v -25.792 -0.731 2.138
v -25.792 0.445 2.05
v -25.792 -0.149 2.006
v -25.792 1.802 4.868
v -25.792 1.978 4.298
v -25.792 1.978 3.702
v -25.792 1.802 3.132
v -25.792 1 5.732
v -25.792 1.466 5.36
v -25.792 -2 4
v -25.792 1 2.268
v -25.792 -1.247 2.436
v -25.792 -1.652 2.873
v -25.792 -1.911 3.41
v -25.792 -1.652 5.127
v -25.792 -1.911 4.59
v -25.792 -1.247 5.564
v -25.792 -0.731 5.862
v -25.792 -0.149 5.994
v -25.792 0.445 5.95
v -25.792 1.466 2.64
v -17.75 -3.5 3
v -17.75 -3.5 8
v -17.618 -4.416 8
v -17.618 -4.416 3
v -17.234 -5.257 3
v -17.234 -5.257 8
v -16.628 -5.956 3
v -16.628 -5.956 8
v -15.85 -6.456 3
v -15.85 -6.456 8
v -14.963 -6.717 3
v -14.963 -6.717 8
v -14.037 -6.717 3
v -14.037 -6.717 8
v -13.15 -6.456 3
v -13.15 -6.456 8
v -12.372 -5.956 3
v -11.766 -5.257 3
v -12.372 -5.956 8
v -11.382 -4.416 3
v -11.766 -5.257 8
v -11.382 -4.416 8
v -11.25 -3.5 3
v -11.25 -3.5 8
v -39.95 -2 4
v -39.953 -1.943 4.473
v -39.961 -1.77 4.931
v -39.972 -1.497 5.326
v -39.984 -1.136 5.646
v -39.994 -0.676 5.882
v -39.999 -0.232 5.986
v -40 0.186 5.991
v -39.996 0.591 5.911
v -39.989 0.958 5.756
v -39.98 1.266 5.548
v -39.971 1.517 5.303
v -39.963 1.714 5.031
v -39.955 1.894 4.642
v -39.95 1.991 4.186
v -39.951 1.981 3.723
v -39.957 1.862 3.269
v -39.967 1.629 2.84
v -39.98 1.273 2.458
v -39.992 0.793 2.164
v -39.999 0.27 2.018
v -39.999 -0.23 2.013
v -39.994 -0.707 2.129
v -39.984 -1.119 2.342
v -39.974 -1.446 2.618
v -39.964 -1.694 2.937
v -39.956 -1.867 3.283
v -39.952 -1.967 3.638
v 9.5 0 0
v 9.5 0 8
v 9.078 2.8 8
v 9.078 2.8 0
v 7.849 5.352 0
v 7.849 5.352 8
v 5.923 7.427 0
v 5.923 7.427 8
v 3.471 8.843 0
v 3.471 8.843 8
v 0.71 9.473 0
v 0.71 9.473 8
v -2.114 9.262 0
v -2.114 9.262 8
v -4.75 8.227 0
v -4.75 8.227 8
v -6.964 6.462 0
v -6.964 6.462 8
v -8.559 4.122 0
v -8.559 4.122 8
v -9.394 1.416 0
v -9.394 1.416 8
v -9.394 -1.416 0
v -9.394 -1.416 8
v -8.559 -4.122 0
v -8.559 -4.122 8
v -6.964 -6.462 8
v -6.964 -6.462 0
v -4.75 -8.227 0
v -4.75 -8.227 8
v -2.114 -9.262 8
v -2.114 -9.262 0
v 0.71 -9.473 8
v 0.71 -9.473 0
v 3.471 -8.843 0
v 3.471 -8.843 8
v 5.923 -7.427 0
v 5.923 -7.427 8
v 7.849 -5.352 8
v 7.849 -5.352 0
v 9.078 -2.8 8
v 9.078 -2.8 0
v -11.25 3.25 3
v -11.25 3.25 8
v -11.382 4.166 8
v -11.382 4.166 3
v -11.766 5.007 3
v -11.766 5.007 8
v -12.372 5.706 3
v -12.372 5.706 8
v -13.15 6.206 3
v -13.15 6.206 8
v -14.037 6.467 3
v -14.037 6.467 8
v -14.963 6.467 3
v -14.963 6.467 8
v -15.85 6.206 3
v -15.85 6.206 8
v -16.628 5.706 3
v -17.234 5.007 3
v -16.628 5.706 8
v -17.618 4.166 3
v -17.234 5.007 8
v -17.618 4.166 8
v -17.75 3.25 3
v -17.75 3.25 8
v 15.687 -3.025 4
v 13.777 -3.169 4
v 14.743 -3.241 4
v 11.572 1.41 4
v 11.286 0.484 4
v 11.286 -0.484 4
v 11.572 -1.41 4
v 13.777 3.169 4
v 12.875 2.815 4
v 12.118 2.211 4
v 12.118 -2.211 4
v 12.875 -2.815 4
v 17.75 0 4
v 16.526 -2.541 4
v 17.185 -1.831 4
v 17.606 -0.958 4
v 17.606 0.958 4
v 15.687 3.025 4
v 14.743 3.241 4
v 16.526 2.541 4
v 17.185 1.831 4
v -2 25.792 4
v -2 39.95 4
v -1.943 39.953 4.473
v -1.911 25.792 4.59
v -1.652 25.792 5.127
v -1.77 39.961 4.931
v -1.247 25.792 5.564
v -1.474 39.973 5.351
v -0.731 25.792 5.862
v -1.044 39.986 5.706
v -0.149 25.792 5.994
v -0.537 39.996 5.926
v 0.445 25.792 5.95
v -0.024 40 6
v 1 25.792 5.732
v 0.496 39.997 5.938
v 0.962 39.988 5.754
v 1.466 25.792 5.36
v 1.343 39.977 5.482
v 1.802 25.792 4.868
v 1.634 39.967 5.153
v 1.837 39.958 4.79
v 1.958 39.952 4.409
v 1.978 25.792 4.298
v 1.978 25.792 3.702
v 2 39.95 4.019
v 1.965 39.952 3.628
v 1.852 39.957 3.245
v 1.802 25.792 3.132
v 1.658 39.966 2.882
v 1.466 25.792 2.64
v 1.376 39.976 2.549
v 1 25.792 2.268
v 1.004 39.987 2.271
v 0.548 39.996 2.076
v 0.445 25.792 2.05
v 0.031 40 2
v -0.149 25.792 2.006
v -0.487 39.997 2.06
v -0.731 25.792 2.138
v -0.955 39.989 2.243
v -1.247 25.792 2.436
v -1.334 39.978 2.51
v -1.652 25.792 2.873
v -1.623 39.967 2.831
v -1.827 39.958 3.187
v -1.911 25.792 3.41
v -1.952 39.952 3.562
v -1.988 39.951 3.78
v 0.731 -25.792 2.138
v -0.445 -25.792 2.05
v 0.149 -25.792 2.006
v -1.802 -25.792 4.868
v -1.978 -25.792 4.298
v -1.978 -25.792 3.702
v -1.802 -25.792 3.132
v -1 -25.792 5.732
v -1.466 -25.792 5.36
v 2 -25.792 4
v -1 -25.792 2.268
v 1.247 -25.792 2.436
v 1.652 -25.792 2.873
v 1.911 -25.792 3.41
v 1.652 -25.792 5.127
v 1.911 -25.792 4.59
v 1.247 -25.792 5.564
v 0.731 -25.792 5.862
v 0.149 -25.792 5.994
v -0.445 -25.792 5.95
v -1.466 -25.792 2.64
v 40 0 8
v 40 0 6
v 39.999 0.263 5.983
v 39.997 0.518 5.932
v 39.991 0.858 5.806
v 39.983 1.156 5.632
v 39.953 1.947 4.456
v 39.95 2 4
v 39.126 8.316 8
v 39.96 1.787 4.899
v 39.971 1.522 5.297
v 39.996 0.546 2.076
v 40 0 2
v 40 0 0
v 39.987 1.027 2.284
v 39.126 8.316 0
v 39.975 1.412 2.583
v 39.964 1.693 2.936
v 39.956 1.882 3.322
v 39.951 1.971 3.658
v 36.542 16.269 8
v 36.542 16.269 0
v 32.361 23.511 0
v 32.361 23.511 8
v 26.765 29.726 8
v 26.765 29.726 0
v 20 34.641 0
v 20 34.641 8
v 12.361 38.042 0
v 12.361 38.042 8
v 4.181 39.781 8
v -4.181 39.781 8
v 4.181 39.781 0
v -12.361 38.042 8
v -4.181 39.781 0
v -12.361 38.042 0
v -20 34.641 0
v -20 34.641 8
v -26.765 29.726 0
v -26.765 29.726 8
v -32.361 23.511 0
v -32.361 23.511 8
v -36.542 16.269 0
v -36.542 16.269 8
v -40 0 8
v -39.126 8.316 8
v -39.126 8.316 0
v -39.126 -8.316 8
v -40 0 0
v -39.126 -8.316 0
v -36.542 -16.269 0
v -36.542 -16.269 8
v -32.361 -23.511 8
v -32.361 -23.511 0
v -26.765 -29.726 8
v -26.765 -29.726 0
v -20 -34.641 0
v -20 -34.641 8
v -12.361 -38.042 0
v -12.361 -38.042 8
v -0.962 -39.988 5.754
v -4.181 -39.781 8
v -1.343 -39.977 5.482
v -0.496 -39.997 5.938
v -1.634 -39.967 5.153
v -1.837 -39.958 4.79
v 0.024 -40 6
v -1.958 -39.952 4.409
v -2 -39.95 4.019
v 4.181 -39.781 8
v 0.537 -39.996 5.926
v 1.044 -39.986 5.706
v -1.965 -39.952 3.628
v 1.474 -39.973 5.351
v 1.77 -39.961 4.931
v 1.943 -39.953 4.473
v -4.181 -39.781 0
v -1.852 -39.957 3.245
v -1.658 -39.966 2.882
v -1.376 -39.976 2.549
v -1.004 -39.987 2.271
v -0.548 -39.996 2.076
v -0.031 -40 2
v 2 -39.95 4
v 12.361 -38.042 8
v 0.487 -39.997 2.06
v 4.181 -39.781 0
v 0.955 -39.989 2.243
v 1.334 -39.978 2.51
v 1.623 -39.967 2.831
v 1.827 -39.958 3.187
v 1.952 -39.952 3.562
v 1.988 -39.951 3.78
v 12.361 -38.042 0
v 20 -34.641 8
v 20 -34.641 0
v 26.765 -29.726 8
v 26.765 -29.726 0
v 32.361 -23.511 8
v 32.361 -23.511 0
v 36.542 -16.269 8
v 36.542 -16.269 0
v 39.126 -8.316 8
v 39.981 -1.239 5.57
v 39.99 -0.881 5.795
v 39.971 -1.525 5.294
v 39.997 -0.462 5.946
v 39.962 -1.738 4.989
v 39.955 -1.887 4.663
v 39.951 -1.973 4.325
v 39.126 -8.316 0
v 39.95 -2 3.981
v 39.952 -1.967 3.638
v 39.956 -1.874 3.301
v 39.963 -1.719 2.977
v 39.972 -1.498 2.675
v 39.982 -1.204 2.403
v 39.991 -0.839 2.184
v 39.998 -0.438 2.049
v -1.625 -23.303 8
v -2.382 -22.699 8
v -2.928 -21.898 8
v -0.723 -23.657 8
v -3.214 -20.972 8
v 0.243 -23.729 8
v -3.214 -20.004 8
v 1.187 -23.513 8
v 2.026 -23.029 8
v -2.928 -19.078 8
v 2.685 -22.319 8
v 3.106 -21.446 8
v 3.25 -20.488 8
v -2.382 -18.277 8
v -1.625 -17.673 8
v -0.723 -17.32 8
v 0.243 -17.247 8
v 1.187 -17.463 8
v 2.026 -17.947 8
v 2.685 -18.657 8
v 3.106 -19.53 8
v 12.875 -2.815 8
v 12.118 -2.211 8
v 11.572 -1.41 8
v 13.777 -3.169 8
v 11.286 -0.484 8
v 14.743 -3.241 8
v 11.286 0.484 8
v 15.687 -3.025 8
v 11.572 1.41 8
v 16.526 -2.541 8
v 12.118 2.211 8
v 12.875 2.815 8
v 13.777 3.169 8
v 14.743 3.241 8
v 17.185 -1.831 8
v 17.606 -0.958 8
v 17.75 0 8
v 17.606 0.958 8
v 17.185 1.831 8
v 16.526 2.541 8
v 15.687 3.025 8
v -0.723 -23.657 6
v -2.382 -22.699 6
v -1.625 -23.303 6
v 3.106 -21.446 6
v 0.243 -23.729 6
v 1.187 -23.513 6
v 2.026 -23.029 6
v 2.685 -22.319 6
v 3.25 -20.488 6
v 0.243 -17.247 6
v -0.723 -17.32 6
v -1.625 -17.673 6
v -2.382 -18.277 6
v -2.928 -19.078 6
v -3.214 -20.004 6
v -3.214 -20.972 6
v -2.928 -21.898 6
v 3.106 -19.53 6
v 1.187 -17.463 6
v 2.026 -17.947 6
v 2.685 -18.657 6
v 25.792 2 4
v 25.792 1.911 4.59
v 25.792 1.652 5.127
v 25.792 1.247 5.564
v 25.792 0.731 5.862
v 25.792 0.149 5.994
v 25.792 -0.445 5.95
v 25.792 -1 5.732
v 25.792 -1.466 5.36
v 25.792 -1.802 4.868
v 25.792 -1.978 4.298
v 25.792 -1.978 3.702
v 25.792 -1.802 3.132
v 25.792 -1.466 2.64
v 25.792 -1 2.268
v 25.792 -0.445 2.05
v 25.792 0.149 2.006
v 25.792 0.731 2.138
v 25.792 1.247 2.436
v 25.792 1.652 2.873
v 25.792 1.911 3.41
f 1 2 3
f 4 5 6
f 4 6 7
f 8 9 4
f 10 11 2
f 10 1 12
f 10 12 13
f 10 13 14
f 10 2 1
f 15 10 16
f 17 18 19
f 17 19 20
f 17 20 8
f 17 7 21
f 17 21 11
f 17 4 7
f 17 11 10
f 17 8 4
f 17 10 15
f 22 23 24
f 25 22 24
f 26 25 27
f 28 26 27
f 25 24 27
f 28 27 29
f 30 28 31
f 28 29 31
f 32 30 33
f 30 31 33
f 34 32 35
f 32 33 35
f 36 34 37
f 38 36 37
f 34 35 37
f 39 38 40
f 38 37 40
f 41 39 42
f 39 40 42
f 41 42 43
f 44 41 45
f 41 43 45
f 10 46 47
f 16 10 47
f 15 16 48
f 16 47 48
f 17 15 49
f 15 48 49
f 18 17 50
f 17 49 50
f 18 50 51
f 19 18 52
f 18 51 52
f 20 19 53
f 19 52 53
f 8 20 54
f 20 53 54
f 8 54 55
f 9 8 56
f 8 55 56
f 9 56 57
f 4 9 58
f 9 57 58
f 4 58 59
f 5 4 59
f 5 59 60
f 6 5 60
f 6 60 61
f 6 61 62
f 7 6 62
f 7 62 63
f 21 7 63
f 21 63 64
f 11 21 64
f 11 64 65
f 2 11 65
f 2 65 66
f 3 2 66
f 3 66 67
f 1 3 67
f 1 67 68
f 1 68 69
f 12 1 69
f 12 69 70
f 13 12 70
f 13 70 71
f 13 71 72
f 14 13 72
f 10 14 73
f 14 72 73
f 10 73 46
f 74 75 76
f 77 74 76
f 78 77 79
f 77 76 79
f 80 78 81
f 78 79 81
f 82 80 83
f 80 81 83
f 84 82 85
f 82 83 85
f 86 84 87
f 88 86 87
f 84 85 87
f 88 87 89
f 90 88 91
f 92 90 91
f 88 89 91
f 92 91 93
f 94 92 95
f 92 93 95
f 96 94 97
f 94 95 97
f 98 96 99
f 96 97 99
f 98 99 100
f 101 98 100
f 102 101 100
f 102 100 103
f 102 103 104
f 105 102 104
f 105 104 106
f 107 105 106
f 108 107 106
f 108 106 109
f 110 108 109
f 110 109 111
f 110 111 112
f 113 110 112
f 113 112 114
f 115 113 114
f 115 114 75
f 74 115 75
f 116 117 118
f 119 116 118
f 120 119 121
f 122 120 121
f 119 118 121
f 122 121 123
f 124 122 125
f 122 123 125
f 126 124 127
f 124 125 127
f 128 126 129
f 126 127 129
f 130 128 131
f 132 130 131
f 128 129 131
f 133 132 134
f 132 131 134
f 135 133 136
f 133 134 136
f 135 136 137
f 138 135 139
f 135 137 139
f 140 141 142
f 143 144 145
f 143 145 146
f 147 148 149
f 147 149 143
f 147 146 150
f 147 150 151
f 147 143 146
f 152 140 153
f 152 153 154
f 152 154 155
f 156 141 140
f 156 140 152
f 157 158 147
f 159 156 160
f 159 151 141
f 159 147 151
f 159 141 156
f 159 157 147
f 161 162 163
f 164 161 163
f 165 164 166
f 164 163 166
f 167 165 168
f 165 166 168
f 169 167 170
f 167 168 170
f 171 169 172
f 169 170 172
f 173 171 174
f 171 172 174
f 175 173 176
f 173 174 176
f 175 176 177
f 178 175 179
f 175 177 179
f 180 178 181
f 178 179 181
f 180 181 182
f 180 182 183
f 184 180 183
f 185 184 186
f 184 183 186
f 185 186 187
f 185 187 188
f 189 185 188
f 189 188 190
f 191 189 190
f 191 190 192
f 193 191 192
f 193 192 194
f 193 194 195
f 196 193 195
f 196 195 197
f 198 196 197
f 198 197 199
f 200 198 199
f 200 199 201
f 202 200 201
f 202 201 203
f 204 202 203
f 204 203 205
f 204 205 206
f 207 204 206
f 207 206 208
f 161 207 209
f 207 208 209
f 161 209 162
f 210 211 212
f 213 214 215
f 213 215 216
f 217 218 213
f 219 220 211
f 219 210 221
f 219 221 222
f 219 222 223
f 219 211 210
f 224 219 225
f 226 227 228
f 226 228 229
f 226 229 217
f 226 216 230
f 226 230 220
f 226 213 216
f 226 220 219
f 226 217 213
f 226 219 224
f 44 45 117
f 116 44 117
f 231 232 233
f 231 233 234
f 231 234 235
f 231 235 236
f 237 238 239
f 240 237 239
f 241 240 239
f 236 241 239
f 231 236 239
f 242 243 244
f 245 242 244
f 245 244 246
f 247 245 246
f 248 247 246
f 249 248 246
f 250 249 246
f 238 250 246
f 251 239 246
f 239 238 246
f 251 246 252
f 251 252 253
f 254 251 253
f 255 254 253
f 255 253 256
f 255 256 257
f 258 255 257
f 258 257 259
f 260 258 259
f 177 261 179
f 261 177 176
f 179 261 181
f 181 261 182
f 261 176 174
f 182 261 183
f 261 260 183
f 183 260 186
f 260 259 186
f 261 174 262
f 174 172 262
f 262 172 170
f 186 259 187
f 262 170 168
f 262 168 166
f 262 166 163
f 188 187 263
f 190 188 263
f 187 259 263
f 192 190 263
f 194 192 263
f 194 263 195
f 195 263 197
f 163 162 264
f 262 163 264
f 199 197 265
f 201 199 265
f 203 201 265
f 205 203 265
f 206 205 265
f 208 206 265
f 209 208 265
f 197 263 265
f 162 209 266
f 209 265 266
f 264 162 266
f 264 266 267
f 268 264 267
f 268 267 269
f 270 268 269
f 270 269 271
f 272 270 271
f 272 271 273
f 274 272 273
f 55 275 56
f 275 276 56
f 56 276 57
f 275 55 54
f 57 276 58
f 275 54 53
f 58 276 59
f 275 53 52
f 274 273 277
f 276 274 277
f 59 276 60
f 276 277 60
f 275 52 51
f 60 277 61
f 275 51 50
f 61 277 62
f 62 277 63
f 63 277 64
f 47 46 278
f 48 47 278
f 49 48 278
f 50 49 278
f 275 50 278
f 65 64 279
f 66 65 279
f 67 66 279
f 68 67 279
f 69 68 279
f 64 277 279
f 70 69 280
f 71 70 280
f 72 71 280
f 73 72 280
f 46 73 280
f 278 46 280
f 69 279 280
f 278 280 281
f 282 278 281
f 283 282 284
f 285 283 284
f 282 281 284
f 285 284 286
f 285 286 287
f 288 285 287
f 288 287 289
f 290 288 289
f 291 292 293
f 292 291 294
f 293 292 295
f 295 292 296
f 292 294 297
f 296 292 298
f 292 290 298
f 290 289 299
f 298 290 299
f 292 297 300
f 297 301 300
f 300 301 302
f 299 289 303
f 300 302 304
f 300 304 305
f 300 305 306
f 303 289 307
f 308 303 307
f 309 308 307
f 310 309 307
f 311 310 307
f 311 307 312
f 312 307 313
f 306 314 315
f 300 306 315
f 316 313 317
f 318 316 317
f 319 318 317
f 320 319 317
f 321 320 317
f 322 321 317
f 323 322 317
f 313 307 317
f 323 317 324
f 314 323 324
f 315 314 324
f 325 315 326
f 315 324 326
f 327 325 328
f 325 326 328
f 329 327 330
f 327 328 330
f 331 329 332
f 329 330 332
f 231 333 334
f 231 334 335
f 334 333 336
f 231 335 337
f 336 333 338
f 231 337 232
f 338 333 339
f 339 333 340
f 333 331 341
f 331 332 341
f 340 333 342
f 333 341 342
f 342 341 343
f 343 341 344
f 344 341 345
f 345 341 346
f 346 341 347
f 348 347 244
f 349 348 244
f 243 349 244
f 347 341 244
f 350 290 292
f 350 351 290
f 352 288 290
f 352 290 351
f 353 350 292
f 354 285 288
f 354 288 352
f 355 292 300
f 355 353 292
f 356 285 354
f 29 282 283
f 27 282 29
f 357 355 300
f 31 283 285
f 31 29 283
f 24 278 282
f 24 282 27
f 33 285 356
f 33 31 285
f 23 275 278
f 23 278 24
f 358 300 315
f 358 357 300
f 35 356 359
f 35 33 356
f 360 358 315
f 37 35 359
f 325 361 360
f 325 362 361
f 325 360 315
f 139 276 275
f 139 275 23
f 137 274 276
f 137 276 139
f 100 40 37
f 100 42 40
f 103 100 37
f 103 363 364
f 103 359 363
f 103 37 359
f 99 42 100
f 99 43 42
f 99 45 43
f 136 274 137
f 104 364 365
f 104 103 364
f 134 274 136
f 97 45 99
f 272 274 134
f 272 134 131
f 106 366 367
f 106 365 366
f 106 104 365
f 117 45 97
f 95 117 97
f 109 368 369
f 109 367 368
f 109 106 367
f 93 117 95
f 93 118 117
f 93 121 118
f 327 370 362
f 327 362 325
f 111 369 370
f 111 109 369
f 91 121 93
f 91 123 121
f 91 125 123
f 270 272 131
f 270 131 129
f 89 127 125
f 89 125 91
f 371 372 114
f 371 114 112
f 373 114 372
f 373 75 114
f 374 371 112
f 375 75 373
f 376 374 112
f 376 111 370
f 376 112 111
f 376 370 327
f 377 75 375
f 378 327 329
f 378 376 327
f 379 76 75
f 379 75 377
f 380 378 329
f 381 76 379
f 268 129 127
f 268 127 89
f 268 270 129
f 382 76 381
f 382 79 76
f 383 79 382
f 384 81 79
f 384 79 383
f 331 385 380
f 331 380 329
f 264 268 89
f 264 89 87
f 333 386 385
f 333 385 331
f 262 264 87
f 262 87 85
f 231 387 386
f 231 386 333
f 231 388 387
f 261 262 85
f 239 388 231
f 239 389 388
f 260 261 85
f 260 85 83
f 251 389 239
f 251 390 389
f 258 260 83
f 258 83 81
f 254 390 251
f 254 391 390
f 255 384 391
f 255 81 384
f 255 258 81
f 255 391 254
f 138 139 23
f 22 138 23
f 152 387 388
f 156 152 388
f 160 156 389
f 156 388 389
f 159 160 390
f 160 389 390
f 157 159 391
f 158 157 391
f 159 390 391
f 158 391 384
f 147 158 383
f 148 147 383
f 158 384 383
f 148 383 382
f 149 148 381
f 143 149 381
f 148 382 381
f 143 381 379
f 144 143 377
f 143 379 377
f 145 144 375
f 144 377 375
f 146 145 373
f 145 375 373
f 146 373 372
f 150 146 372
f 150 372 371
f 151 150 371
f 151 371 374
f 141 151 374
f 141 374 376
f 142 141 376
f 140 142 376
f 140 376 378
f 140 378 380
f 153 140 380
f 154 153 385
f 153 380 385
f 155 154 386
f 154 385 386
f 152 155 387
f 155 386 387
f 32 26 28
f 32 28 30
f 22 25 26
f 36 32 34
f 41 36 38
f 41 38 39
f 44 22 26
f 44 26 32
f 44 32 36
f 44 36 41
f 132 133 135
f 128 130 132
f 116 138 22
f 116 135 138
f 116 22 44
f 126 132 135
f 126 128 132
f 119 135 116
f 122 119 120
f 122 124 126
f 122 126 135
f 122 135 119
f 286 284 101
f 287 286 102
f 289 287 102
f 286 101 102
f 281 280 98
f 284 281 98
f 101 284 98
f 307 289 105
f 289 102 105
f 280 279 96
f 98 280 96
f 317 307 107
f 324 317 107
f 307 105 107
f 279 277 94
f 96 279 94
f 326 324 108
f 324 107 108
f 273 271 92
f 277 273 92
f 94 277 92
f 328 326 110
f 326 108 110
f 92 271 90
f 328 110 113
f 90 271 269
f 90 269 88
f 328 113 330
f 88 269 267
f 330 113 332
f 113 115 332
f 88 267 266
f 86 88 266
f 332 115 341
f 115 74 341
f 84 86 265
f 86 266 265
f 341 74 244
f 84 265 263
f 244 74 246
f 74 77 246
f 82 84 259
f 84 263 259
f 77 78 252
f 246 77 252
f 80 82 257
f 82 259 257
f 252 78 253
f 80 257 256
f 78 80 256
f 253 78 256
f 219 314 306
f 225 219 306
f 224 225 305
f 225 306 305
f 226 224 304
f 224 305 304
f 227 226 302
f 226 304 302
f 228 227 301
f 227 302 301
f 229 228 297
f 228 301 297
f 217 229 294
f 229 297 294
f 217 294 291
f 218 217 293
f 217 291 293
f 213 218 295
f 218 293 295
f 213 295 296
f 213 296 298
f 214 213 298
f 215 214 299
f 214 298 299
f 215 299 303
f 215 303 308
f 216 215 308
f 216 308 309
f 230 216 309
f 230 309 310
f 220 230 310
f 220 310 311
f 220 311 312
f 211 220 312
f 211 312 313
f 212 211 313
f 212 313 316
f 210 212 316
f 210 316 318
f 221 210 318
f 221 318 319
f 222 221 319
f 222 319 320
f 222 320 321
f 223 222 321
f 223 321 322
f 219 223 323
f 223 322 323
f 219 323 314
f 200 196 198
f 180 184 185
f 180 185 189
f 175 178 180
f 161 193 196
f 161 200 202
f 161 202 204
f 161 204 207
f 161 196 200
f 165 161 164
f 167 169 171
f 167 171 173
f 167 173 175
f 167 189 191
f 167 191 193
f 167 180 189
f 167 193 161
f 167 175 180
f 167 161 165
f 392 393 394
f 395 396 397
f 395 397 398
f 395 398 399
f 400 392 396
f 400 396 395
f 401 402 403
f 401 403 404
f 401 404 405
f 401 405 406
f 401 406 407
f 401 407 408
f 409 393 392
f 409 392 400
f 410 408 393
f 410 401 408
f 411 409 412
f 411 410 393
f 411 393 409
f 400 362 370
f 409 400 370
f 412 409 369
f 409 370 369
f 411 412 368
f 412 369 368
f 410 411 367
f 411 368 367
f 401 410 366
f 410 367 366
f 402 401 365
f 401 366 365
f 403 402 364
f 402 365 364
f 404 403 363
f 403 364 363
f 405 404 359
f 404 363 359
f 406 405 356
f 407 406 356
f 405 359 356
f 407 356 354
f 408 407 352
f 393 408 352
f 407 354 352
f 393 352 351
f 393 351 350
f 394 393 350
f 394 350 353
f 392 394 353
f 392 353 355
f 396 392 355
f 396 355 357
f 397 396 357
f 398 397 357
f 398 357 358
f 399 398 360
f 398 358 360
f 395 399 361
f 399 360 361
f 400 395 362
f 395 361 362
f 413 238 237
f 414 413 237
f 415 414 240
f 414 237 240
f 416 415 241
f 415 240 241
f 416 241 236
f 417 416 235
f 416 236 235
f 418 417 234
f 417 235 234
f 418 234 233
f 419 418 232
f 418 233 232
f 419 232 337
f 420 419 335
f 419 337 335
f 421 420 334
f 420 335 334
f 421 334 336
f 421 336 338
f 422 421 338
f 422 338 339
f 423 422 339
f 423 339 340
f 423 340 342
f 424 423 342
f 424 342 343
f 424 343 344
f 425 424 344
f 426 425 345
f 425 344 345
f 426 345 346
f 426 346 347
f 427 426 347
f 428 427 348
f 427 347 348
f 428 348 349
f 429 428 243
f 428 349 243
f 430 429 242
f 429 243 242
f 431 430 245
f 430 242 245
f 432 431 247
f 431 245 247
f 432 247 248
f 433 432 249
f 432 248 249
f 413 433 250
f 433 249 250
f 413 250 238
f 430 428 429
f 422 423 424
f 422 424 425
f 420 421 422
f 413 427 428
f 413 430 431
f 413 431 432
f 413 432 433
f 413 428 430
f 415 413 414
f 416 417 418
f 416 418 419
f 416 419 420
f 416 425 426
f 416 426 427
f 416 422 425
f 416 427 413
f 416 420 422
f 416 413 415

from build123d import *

# Parameters (mm, degrees)
F0_R             = 40
F1_DEPTH         = 8
F2_R             = 9.5
F3_DEPTH         = 8.001
F5_R             = 3.25
F6_DEPTH         = 4
F8_DEPTH         = 5
F9_R             = 3.25
F10_DEPTH        = 2
F12_R            = 2
F13_DEPTH        = 15
F13_COPIES_COUNT = 4


# Not quite as in the source:
# - a pattern or mirror of a feature is missing from the dataset's text; its kind, count and spacing are read off the source's solid


with BuildPart() as f1:
    # F0 (on Top) → F1 (new body)
    with BuildSketch(Plane.XY):
        Circle(F0_R)
    extrude(amount=F1_DEPTH)

    # F2 (on face) → F3 (cut, through all)
    with BuildSketch(Plane.XY.offset(8)):
        Circle(F2_R)
    extrude(amount=-F3_DEPTH, mode=Mode.SUBTRACT)

    # F5 (on face) → F6 (cut)
    with BuildSketch(Plane.XY.offset(8)):
        with Locations((14.5, 0)):
            Circle(F5_R)
    extrude(amount=-F6_DEPTH, mode=Mode.SUBTRACT)

    # F7 (on face) → F8 (cut)
    with BuildSketch(Plane.XY.offset(8)):
        with BuildLine():
            Line((-17.75, 3.25), (-17.75, -3.5))
            ThreePointArc((-17.75, -3.5), (-14.5, -6.75), (-11.25, -3.5))
            Line((-11.25, -3.5), (-11.25, 3.25))
            ThreePointArc((-11.25, 3.25), (-14.5, 6.5), (-17.75, 3.25))
        make_face()
    extrude(amount=-F8_DEPTH, mode=Mode.SUBTRACT)

    # F9 (on face) → F10 (cut)
    with BuildSketch(Plane.XY.offset(8)):
        with Locations((0, -20.4880452948)):
            Circle(F9_R)
    extrude(amount=-F10_DEPTH, mode=Mode.SUBTRACT)

    # F12 (on offset) → F13 (cut)
    with BuildSketch(Plane.XZ.offset(40.792)):
        with Locations((0, 4)):
            Circle(F12_R)
    f13 = extrude(amount=-F13_DEPTH, mode=Mode.SUBTRACT)

    # F13_copies: F13 ×4 about axis
    f13_copies_axis = Axis((0, 0, 0), (0, 0, 1))
    for i in range(1, F13_COPIES_COUNT):
        add(f13.rotate(f13_copies_axis, i * 360 / F13_COPIES_COUNT), mode=Mode.SUBTRACT)


solid = f1.part
